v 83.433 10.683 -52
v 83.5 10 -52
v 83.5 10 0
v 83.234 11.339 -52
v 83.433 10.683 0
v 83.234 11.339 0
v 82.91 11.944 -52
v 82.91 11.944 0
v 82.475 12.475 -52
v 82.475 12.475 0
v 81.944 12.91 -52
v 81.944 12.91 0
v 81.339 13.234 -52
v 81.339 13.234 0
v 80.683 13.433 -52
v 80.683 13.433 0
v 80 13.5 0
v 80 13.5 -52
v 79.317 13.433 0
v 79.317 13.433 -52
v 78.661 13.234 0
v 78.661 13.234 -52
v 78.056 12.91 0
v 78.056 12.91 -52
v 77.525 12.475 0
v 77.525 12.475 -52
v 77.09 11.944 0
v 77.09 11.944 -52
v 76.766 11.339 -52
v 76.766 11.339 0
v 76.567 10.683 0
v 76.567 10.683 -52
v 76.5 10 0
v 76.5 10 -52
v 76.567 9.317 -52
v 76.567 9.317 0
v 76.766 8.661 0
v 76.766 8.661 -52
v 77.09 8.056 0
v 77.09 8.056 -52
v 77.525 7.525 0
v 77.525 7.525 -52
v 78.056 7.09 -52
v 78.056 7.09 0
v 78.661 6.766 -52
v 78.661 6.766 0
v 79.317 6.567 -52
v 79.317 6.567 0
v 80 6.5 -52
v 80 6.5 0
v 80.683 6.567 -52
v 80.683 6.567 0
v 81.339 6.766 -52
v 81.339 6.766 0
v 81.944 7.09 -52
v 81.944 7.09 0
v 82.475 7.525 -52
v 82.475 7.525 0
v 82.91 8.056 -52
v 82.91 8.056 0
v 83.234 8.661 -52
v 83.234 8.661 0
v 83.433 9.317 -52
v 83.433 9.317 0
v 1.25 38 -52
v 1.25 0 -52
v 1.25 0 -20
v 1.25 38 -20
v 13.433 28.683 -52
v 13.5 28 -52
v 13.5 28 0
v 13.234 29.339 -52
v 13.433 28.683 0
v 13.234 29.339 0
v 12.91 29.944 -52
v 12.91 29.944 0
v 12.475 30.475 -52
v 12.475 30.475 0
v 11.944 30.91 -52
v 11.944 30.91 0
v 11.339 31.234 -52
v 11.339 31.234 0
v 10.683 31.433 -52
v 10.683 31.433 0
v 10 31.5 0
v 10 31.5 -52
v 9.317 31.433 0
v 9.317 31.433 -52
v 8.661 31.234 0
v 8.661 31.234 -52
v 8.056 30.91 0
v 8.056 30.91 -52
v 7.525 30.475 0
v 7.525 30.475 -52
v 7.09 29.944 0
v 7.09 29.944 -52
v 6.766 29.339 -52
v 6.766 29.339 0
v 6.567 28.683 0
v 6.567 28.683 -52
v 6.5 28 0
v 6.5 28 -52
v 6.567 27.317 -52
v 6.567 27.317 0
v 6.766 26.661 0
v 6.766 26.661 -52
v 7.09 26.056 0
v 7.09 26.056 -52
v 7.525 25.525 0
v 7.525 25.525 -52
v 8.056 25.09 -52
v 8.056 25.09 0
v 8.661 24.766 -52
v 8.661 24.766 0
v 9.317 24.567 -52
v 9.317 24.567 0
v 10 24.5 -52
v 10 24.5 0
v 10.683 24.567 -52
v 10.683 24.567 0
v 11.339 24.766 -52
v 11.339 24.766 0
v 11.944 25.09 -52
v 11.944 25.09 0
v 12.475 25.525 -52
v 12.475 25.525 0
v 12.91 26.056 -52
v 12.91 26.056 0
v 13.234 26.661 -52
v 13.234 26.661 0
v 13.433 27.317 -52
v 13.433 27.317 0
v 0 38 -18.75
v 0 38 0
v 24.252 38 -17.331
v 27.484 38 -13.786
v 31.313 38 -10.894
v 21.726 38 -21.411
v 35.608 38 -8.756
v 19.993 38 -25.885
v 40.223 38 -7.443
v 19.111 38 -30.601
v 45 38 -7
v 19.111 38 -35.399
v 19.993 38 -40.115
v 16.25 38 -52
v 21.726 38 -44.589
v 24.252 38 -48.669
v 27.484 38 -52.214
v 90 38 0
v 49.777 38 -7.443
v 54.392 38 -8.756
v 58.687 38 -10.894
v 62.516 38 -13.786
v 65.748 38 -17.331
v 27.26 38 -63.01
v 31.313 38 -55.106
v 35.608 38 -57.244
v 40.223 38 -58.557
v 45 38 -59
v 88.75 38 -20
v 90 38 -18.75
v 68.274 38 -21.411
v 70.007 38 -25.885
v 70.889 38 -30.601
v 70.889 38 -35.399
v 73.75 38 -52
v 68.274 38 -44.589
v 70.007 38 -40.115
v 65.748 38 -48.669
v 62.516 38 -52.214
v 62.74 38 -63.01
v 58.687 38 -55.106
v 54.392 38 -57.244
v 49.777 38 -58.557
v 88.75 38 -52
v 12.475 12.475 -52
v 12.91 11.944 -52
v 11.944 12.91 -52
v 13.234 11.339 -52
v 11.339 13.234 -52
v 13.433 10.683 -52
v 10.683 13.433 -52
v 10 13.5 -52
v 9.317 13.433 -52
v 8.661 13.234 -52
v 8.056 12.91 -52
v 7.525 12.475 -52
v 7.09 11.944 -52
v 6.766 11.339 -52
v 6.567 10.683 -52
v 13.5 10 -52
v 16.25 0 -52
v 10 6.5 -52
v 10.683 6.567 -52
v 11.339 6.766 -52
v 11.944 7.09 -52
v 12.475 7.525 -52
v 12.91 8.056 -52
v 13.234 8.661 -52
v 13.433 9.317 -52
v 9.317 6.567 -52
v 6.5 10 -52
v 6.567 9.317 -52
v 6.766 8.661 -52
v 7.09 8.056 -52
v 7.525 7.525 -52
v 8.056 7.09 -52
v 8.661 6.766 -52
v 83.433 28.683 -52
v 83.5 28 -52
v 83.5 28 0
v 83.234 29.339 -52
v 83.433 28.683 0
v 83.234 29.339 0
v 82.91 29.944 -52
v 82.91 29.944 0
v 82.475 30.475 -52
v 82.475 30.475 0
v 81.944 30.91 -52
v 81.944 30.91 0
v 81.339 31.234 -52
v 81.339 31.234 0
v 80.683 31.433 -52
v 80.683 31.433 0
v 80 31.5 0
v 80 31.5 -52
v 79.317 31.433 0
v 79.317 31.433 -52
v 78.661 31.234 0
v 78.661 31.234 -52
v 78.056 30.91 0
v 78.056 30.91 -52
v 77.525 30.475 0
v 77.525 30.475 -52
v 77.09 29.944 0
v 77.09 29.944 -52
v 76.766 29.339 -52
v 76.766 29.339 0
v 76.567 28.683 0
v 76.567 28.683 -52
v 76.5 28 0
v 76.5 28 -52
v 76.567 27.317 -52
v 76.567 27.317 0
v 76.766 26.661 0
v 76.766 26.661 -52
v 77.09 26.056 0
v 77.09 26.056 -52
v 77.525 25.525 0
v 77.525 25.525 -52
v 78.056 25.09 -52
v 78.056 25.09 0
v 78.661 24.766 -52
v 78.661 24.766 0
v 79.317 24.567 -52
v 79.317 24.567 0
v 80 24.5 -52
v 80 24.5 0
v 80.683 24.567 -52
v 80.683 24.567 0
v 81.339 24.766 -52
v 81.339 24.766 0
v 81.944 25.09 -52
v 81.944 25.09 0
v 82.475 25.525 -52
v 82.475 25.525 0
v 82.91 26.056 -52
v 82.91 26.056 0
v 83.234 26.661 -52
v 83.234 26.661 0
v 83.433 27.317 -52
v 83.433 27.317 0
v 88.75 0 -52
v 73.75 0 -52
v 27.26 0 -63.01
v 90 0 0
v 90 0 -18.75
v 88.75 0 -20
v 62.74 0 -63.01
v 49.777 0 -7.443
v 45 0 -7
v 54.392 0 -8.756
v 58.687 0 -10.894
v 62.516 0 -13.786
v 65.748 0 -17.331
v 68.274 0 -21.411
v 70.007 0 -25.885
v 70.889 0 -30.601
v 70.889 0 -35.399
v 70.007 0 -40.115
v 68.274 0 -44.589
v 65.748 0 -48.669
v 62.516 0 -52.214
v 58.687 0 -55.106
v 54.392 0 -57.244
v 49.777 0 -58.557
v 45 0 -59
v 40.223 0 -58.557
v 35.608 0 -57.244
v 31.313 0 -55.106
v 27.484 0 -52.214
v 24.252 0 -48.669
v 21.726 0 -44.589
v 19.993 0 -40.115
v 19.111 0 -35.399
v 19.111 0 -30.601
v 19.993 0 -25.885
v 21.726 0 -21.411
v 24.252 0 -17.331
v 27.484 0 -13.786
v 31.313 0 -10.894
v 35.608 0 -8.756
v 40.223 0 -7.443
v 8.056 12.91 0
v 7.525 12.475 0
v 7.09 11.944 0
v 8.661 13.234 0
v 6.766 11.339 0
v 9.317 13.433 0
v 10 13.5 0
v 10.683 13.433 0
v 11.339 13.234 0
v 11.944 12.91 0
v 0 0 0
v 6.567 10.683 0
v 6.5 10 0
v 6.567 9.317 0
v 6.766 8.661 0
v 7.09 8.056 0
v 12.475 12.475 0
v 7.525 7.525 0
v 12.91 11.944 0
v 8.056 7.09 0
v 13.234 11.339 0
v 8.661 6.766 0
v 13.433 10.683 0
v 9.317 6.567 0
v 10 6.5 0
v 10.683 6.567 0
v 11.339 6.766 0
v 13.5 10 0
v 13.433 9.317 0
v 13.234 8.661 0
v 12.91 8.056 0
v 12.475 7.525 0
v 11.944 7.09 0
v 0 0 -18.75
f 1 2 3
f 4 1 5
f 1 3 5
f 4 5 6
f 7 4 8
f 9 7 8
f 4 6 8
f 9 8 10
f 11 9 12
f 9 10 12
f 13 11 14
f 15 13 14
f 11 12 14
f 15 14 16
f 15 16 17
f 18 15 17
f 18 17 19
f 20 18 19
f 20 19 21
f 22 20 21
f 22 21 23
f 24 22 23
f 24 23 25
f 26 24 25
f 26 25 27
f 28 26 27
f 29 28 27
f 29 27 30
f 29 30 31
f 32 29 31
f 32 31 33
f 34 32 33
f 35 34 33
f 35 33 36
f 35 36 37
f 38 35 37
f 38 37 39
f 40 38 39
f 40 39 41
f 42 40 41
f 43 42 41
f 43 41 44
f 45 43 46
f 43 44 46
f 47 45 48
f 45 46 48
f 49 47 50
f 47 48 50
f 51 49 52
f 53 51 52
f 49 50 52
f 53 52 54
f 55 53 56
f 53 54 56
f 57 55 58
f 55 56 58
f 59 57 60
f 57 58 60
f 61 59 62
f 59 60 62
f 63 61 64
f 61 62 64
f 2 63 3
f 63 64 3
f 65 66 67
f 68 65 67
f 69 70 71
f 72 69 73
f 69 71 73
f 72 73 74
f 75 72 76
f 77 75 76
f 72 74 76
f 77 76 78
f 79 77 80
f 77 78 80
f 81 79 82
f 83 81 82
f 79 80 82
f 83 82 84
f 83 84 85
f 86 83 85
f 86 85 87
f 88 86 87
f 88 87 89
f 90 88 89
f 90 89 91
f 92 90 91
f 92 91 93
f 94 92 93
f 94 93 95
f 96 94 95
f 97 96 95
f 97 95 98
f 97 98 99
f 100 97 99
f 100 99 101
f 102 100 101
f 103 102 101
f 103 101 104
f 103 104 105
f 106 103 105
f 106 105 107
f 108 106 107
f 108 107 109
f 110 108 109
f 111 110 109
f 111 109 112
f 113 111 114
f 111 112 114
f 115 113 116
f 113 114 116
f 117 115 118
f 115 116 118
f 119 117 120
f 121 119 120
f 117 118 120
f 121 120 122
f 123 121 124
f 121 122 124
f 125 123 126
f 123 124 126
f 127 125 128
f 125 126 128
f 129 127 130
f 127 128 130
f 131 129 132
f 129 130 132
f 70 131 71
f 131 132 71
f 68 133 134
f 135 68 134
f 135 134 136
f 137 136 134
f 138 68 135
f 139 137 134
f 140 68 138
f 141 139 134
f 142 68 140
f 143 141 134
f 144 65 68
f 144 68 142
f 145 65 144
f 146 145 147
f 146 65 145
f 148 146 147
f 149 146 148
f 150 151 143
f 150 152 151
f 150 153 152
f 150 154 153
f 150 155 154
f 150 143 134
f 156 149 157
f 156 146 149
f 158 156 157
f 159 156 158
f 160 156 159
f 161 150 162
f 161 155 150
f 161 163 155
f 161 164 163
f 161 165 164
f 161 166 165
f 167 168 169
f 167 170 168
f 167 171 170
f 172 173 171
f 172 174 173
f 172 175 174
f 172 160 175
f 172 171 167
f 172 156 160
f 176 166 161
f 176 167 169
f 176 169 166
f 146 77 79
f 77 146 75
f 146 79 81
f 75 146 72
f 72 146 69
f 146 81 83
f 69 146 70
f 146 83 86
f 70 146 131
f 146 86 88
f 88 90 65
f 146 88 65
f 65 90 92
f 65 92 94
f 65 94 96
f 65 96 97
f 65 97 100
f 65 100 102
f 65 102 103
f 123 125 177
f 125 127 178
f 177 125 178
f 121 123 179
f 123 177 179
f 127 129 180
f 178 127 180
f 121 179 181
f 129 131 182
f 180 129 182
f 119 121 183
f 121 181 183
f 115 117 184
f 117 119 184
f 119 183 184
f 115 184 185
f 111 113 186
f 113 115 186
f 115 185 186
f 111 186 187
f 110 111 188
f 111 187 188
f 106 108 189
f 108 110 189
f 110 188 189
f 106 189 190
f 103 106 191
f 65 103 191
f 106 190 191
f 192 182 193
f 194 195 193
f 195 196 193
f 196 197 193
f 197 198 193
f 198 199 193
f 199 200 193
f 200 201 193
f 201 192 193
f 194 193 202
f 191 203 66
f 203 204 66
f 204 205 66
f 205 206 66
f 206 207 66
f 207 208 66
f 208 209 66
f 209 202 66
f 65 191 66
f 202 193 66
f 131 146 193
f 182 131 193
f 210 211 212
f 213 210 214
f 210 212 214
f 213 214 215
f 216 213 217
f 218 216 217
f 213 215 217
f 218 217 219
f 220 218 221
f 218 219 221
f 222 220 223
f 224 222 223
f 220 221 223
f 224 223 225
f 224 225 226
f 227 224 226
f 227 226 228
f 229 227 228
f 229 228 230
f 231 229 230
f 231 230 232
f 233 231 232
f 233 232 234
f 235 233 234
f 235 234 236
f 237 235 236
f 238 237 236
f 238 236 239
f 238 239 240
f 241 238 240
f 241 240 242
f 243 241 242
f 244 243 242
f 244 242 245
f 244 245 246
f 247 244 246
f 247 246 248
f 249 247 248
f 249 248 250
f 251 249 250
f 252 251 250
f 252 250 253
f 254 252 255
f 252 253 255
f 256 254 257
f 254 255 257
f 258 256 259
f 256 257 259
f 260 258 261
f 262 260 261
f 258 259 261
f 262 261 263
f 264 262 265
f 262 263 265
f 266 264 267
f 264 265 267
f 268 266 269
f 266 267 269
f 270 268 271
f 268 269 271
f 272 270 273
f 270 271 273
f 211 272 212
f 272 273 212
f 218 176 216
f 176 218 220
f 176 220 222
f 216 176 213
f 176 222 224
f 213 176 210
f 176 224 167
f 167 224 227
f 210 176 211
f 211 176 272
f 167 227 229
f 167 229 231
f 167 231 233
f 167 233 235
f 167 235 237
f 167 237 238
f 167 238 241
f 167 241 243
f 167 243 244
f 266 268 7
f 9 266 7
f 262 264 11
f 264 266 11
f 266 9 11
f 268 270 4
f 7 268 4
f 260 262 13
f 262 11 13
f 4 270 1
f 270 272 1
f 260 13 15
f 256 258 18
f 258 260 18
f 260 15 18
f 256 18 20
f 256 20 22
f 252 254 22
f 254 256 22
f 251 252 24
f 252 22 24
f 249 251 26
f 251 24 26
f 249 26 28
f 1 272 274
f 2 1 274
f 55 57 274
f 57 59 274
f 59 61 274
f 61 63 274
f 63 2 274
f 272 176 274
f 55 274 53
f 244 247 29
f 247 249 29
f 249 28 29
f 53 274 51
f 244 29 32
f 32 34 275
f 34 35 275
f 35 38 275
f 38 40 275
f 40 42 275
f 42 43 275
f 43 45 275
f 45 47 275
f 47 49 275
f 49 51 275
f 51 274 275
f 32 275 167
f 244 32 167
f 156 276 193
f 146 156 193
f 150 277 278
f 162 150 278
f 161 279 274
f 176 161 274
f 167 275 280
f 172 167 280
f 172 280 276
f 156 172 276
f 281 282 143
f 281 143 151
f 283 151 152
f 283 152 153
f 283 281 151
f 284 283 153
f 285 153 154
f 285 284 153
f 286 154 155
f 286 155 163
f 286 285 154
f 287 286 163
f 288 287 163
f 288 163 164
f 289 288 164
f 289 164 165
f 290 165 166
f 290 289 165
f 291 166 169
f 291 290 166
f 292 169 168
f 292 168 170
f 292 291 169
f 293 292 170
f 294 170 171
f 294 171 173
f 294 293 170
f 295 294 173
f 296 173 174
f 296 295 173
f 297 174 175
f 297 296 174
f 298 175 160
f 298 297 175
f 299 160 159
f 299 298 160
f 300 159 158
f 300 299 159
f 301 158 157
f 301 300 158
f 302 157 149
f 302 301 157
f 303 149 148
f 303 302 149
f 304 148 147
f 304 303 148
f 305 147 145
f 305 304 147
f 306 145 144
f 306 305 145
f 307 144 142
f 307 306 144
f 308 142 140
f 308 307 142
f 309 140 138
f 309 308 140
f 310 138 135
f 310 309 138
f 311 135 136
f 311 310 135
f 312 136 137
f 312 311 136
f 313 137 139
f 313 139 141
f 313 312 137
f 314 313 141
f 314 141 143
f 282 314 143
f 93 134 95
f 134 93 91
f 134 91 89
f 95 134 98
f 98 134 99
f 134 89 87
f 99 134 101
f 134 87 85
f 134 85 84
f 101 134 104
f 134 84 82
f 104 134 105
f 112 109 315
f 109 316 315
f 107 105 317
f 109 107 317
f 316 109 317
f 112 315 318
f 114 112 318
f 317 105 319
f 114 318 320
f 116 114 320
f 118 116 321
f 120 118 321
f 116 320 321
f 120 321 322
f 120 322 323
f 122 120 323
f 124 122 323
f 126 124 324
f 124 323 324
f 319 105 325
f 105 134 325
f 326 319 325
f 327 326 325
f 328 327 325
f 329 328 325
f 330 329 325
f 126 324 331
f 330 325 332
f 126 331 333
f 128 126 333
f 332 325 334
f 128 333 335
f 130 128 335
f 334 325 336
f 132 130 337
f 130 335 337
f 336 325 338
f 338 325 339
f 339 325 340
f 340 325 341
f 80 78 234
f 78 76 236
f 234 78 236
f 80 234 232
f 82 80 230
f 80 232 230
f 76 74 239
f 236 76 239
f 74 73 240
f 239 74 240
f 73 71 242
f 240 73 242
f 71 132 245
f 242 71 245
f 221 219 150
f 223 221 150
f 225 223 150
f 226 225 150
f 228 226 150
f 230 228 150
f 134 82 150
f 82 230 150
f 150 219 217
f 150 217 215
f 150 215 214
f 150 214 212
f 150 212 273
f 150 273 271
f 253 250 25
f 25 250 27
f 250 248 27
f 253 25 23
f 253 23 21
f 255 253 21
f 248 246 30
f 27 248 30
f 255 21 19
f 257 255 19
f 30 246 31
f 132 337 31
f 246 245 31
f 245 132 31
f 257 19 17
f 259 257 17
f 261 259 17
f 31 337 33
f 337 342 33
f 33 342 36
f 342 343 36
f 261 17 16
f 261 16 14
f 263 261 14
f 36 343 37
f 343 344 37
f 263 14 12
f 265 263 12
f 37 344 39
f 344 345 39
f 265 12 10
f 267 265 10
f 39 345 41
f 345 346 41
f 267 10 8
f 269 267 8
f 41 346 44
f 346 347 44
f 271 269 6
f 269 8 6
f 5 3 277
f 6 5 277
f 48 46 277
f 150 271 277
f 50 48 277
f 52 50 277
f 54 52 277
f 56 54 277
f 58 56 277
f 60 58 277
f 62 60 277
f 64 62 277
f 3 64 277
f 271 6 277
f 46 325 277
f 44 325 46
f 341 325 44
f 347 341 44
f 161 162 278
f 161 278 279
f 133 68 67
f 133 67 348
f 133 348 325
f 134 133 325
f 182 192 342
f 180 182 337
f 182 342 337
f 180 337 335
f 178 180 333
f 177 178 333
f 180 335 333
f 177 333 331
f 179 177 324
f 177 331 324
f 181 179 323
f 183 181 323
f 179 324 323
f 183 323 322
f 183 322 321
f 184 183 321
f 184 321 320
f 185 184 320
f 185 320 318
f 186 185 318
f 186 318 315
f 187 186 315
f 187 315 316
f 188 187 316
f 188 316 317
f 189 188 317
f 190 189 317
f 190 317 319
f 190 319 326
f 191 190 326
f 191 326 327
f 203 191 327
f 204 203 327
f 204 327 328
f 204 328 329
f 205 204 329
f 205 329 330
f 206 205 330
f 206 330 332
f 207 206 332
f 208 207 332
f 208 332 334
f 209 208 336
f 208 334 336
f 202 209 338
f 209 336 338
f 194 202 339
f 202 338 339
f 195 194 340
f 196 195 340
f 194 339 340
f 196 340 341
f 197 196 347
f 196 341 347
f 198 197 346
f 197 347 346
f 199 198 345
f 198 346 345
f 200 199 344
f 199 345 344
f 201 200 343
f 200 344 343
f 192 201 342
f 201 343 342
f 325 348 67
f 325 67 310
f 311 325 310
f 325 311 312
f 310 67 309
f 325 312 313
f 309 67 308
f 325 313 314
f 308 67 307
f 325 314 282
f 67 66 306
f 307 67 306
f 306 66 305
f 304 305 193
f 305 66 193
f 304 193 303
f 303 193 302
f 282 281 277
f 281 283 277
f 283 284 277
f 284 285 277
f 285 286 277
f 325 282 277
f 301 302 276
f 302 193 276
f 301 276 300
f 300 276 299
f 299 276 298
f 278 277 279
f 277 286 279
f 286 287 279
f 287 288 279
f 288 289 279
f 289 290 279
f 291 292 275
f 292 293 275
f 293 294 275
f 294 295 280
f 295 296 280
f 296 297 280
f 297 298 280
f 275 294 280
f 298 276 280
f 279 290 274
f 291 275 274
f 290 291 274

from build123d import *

# Parameters (mm, degrees)
SKETCH1_R           = 26
BOSS_EXTRUDE1_DEPTH = 38
SKETCH2_R           = 3.5
CUT_EXTRUDE1_DEPTH  = 117.250849889


with BuildPart() as part:
    # Sketch1 → Boss-Extrude1 (new body)
    with BuildSketch(Plane(origin=(0, 0, 0), x_dir=(1, 0, 0), z_dir=(0, 1, 0))):
        Polygon((88.75, 0), (90, 0), (90, 18.75), (88.75, 20), (88.75, 52), (73.75, 52), (62.74, 63.01), (27.26, 63.01), (16.25, 52), (1.25, 52), (1.25, 20), (0, 18.75), (0, 0), (1.25, 0), (45, 0), align=None)
        with Locations(Location((45, 33, 0), (0, 0, 270))):
            Circle(SKETCH1_R, mode=Mode.SUBTRACT)
    extrude(amount=BOSS_EXTRUDE1_DEPTH)

    # Sketch2 → Cut-Extrude1 (cut, through all)
    with BuildSketch(Plane.XY):
        with Locations((10, 28)):
            Circle(SKETCH2_R)
        with Locations((10, 10)):
            Circle(SKETCH2_R)
        with Locations((80, 28)):
            Circle(SKETCH2_R)
        with Locations((80, 10)):
            Circle(SKETCH2_R)
    extrude(amount=-CUT_EXTRUDE1_DEPTH, mode=Mode.SUBTRACT)


solid = part.part
